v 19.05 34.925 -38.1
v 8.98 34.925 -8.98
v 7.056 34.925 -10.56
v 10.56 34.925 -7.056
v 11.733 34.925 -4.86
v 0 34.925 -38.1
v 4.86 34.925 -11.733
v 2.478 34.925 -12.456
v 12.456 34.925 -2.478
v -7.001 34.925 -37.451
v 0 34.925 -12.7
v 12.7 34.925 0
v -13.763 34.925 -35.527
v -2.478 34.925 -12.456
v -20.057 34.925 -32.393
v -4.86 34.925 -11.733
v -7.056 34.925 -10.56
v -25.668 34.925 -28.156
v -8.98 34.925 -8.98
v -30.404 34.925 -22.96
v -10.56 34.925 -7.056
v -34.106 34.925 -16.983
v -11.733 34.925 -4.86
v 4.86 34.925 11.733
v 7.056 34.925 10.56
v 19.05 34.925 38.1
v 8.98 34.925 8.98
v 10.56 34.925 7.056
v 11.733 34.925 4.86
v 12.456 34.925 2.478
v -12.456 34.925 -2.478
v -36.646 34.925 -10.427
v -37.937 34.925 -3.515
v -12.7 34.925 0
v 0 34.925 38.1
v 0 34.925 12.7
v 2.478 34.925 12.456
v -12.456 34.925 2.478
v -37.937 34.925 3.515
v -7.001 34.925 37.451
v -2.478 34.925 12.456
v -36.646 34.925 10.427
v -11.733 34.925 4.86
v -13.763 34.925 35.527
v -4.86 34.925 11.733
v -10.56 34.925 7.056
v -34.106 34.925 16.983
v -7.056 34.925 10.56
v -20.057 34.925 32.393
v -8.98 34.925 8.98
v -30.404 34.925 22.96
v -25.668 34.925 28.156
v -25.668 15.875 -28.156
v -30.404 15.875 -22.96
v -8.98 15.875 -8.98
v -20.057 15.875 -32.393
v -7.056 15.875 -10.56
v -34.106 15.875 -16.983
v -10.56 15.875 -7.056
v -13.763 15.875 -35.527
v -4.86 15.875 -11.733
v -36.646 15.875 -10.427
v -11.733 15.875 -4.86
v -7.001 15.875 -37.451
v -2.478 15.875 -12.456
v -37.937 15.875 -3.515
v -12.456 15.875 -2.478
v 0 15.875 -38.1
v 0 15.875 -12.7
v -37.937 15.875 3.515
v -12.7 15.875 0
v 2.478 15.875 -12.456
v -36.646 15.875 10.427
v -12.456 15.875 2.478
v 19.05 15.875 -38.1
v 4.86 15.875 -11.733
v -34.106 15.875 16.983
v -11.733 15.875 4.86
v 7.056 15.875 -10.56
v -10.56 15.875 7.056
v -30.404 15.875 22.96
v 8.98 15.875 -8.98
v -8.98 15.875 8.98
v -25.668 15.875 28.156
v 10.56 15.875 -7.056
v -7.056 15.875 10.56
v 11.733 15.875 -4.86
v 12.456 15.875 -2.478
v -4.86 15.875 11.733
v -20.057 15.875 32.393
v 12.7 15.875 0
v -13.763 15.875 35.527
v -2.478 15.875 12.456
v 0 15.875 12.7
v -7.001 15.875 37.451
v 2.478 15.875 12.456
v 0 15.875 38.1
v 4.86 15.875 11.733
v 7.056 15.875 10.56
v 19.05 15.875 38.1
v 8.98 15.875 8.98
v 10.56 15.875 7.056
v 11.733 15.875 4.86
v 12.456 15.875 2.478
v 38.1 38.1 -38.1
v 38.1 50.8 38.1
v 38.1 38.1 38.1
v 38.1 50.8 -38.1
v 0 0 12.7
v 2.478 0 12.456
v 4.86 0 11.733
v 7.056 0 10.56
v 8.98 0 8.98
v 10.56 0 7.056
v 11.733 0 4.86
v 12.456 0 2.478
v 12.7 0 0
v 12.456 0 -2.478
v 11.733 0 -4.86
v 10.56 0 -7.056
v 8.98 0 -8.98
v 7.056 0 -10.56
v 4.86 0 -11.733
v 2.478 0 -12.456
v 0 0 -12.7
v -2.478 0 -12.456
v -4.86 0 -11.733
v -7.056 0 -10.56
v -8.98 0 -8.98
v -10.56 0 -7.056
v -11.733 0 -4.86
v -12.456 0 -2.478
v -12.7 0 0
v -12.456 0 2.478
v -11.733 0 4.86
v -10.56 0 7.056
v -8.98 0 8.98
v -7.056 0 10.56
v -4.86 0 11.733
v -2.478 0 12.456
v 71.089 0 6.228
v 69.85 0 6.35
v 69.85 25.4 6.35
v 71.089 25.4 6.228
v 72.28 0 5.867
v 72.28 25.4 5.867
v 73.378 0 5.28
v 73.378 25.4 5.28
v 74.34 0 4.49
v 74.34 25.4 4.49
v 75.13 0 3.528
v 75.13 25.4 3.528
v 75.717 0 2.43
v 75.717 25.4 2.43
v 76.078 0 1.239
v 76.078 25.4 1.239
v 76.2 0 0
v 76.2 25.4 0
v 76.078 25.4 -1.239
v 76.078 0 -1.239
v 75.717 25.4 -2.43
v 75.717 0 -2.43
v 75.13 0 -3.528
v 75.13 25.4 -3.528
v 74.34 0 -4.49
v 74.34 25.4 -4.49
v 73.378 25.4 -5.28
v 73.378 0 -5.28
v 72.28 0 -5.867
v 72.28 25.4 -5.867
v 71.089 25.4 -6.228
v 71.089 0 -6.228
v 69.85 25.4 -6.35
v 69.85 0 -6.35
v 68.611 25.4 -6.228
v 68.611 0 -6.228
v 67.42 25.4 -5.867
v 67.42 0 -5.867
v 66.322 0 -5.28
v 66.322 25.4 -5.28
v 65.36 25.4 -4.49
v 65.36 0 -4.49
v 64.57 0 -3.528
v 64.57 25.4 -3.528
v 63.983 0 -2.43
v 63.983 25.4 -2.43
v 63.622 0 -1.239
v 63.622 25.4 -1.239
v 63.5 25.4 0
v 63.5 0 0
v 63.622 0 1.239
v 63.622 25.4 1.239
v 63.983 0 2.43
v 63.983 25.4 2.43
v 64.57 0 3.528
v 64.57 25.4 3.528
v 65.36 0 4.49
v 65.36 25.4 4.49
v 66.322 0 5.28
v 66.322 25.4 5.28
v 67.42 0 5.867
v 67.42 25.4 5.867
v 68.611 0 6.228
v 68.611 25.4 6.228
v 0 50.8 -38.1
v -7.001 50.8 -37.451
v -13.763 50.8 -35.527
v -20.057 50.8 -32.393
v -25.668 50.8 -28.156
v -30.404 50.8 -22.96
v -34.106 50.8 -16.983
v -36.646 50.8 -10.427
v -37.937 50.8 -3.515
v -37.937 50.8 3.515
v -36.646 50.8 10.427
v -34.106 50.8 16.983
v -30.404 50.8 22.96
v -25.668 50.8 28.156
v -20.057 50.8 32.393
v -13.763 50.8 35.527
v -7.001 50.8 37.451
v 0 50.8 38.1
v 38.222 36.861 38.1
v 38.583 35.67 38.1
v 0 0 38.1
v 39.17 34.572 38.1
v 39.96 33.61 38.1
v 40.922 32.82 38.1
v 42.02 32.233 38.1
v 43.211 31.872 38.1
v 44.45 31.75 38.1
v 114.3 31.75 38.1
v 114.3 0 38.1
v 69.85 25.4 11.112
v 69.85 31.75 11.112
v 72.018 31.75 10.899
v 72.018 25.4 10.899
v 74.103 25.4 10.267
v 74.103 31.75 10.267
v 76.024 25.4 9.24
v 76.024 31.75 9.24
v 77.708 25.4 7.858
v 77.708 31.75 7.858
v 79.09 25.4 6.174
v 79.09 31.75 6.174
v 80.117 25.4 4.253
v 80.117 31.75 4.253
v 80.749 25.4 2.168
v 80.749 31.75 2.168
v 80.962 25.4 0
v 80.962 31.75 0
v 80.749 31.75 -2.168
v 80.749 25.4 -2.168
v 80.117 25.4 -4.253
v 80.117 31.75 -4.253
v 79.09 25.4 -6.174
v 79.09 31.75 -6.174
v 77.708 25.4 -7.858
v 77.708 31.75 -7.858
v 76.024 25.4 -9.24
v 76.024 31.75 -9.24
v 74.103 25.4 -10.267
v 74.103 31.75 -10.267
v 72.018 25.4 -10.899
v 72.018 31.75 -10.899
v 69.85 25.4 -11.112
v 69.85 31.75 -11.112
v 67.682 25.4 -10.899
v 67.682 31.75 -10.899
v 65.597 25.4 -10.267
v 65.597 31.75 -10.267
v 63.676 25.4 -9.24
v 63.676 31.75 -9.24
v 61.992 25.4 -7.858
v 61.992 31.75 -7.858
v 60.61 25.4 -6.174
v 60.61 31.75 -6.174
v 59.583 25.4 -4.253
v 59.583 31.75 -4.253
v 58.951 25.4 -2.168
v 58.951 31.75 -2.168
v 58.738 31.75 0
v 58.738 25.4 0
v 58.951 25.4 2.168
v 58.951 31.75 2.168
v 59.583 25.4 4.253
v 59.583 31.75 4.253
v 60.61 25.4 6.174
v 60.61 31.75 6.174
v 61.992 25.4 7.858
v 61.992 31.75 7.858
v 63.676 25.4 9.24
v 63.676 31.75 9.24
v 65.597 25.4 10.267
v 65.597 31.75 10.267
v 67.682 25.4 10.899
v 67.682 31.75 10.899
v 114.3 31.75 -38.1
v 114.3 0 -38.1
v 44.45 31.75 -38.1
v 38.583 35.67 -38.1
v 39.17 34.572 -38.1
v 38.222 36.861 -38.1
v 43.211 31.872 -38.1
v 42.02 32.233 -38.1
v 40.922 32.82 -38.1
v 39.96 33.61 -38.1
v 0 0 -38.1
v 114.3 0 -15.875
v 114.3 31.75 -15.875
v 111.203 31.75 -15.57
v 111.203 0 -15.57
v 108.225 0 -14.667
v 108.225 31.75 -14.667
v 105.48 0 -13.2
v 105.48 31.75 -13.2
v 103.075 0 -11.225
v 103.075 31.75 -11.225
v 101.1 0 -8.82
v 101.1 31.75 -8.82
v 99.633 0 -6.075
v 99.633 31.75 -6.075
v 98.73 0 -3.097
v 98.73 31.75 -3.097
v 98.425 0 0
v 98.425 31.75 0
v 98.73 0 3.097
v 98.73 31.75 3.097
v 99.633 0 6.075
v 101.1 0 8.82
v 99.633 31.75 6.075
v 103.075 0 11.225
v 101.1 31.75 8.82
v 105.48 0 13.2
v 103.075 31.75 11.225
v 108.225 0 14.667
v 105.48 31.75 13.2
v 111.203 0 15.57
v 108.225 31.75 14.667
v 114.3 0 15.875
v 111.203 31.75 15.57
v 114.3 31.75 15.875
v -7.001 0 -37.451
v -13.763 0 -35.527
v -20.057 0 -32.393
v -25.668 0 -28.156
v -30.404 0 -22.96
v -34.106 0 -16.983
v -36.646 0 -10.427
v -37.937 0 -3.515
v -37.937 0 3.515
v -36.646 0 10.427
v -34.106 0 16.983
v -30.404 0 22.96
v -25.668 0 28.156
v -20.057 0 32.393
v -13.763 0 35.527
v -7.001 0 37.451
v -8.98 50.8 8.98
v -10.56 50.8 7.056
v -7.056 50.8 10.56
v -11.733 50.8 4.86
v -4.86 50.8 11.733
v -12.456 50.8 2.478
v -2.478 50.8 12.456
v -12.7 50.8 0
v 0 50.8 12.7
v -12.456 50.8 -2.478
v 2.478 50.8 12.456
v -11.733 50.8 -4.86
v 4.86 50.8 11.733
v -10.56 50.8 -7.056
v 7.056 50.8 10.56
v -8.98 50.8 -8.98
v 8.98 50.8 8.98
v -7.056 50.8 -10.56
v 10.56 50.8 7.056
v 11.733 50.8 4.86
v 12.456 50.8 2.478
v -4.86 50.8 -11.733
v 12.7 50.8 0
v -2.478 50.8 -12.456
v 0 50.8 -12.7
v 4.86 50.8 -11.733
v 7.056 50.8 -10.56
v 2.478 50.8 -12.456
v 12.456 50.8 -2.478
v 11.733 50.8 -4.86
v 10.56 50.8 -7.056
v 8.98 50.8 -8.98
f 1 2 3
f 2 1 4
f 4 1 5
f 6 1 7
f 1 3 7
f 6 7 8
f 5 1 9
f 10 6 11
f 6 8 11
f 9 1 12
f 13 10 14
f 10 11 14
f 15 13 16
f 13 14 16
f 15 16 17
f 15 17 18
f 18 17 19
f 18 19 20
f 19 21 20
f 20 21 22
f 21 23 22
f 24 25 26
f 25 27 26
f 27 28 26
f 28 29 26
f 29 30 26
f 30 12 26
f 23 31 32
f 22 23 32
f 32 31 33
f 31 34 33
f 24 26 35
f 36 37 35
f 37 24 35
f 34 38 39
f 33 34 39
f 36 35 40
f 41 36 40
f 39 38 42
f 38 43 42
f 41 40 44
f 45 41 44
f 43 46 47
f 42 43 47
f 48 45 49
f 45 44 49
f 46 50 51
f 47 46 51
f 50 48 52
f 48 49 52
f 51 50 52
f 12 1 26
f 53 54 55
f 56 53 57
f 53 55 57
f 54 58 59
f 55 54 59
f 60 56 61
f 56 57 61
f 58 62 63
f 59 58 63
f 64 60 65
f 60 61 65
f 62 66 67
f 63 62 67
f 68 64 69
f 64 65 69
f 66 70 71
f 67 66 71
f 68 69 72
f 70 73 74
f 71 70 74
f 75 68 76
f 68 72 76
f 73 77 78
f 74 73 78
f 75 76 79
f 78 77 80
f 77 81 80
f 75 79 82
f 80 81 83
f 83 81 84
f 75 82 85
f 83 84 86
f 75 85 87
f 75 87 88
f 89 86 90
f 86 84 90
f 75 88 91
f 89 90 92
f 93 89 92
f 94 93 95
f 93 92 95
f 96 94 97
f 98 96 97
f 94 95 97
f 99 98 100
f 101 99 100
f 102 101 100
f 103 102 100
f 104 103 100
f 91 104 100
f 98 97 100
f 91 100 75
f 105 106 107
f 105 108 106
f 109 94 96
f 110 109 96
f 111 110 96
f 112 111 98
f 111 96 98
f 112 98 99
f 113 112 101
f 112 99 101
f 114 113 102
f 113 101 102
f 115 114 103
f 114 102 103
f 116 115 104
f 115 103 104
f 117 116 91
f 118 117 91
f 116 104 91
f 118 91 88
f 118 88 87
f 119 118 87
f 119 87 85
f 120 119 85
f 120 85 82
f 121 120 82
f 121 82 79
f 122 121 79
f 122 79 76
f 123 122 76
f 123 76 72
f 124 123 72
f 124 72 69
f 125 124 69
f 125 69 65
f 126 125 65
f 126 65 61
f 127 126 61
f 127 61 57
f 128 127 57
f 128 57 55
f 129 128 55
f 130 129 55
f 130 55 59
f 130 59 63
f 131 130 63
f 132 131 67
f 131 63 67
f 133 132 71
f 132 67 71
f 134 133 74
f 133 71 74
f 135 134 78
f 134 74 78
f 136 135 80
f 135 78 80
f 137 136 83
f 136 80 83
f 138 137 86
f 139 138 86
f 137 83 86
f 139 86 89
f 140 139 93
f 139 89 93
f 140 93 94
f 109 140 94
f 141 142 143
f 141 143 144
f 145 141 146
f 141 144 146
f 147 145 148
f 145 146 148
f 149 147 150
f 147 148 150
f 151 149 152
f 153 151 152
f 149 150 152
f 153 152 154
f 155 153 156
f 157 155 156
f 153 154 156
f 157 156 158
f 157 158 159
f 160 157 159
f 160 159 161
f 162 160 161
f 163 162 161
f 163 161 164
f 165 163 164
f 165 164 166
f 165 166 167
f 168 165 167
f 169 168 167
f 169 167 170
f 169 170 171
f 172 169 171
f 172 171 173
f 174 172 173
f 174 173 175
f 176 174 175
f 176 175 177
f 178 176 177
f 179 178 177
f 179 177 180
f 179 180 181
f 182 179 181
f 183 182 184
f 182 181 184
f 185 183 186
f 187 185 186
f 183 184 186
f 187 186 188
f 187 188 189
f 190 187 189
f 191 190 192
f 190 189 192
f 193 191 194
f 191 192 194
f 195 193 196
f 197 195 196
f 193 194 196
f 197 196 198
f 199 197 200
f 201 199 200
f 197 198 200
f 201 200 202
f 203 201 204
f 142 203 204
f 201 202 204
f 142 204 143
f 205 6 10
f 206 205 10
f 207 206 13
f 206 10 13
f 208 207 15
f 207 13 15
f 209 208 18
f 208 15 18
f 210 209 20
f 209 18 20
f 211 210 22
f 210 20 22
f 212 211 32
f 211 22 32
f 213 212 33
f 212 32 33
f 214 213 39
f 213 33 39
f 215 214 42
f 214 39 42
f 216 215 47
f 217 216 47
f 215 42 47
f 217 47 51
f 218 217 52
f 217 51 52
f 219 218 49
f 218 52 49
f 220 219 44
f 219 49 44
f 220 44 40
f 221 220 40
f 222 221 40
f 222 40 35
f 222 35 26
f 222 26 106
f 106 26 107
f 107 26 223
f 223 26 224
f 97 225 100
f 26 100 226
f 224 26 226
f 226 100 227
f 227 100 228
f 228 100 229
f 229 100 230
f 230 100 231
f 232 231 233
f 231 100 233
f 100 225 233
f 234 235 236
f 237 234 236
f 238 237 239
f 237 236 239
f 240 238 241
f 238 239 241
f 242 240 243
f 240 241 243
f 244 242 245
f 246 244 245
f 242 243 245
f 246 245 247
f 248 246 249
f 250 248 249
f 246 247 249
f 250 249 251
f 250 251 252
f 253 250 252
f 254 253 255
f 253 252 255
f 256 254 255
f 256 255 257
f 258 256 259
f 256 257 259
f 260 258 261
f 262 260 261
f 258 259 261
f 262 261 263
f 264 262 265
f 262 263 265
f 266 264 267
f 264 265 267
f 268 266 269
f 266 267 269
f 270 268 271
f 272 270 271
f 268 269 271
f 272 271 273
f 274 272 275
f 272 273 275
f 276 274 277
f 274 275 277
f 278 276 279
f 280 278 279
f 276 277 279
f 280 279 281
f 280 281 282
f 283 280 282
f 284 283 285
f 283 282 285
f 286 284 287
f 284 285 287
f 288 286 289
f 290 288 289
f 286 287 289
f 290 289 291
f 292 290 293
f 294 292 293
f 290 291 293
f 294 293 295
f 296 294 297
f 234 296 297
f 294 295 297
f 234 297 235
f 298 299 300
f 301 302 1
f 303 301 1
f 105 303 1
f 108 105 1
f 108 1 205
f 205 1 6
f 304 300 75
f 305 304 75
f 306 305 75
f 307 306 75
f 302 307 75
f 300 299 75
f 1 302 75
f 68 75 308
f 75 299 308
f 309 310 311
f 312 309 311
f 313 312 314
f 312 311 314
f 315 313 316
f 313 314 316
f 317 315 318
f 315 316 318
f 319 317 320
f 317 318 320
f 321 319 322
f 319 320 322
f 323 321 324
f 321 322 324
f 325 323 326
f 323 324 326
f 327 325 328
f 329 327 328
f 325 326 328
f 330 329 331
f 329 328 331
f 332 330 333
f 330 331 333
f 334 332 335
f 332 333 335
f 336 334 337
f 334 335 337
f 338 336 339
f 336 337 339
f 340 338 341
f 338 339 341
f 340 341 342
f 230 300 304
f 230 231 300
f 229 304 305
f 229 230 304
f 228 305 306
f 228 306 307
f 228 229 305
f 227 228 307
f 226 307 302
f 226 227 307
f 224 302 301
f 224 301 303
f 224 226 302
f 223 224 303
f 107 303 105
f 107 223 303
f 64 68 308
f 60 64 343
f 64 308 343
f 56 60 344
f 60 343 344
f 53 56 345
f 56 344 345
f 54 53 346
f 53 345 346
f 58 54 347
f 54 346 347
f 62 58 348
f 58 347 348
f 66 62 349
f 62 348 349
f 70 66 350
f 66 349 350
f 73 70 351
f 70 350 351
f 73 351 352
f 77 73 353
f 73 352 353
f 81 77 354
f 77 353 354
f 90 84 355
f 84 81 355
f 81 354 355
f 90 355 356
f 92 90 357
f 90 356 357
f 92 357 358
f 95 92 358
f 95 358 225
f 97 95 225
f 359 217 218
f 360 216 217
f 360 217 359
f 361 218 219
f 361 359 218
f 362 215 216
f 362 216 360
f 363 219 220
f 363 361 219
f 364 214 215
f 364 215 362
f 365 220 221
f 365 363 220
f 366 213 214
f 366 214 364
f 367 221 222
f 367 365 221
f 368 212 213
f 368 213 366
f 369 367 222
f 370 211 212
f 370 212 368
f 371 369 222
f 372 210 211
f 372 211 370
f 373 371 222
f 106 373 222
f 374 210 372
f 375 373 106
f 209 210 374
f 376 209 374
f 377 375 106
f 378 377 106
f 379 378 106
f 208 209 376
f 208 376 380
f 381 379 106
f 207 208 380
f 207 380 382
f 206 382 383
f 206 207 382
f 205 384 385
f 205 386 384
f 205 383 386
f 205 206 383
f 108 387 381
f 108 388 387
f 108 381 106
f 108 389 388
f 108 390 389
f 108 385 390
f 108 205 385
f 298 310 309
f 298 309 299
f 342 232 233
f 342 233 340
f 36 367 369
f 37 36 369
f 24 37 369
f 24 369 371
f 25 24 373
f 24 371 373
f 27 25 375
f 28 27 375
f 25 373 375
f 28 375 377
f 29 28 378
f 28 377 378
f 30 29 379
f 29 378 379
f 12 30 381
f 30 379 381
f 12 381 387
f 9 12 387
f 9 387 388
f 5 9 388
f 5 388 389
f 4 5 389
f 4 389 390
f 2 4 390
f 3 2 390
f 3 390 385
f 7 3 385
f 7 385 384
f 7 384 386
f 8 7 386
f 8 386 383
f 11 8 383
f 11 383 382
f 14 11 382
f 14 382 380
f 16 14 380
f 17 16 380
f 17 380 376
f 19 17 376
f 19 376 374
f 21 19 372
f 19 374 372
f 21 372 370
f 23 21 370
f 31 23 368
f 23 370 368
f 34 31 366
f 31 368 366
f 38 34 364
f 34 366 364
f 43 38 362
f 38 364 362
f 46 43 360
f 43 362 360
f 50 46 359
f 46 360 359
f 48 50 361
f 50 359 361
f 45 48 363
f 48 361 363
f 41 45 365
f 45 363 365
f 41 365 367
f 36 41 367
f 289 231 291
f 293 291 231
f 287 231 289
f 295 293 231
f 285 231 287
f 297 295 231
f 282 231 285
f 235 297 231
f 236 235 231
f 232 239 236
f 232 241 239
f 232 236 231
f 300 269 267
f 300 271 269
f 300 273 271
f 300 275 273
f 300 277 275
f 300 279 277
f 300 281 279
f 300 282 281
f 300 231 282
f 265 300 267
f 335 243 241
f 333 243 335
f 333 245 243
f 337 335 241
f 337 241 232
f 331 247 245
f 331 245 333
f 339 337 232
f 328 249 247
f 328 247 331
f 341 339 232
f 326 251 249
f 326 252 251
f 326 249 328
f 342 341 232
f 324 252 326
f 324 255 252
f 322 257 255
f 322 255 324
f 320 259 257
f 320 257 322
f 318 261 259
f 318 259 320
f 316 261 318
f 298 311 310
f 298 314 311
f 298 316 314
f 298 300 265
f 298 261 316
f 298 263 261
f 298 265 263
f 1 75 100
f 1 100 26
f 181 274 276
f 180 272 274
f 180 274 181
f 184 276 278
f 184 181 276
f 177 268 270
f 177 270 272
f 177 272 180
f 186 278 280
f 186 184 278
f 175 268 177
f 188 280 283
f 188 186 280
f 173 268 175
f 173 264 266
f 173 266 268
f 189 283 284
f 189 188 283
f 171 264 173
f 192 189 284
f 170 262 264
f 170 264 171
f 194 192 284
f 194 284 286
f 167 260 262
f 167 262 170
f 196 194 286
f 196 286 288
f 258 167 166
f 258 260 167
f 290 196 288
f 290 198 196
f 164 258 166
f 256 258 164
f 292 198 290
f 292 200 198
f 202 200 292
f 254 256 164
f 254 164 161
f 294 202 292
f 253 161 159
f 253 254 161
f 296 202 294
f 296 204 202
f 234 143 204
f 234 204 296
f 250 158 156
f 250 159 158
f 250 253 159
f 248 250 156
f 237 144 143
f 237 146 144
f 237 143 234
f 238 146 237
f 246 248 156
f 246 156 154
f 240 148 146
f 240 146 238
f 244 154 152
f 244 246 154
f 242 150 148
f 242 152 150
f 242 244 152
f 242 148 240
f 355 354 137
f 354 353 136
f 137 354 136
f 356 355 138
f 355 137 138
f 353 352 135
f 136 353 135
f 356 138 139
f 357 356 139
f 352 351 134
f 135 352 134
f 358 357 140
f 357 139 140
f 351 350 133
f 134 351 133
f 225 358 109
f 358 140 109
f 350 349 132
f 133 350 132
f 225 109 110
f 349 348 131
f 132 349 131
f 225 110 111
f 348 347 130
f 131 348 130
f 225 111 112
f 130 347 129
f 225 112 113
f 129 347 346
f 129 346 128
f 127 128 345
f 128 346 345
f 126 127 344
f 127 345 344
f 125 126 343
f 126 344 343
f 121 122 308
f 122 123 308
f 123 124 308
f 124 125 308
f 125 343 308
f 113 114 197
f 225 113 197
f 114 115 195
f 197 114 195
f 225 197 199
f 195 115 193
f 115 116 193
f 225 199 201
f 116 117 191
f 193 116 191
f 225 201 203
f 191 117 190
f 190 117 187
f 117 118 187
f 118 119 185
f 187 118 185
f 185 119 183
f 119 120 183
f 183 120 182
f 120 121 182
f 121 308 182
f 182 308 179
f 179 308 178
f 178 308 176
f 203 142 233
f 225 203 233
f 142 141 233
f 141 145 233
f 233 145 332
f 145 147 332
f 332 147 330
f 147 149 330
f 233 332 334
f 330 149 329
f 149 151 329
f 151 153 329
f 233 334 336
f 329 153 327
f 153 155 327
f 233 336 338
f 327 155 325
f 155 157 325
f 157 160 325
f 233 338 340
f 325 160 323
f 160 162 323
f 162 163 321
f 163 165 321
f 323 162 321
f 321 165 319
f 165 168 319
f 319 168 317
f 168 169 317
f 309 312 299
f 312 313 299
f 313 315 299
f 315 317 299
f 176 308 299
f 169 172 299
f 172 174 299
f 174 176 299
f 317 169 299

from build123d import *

# Parameters (mm, degrees)
BOSS_EXTRUDE1_DEPTH     = 50.8
CUT_EXTRUDE1_DEPTH      = 147.463544952
CUT_EXTRUDE1_DEPTH_BACK = 147.463544952
FILLET1_R               = 6.35
SKETCH5_W               = 19.05
SKETCH5_H               = 19.05
SKETCH5_W_2             = 47.515662577
CUT_EXTRUDE2_DEPTH      = 147.463544952
SKETCH6_R               = 12.7
CUT_EXTRUDE3_DEPTH      = 131.754502791
SKETCH7_R               = 15.875
SKETCH7_R_2             = 6.35
CUT_EXTRUDE4_DEPTH      = 125.595997127
SKETCH8_R               = 11.1125
CUT_EXTRUDE5_DEPTH      = 6.35


with BuildPart() as part:
    # Sketch2 → Boss-Extrude1 (new body)
    with BuildSketch(Plane(origin=(0, 0, 0), x_dir=(1, 0, 0), z_dir=(0, 1, 0))):
        with BuildLine():
            Line((0, -38.1), (114.3, -38.1))
            Line((114.3, -38.1), (114.3, 38.1))
            Line((114.3, 38.1), (0, 38.1))
            ThreePointArc((0, 38.1), (-38.1, 0), (0, -38.1))
        make_face()
    extrude(amount=BOSS_EXTRUDE1_DEPTH)

    # Sketch3 → Cut-Extrude1 (cut, two sides: drawn at the far end of the back side and taken through both)
    with BuildSketch(Plane.XY.offset(38.1).offset(-CUT_EXTRUDE1_DEPTH_BACK)):
        Polygon((38.1, 372.144327072), (38.1, 50.8), (38.1, 31.75), (114.3, 31.75), (435.644327072, 31.75), (853.647106265, 519.932735), (456.102779193, 860.327062073), align=None)
    extrude(amount=CUT_EXTRUDE1_DEPTH + CUT_EXTRUDE1_DEPTH_BACK, mode=Mode.SUBTRACT)

    # Fillet1
    fillet1_edges = [part.edges().sort_by_distance(p)[0] for p in [
        (38.1, 31.75, 0),
    ]]
    fillet(fillet1_edges, radius=FILLET1_R)

    # Sketch5 → Cut-Extrude2 (cut, through all)
    with BuildSketch(Plane.XY.offset(38.1)):
        with Locations((9.525, 25.4)):
            Rectangle(SKETCH5_W, SKETCH5_H)
        with Locations((-23.757831289, 25.4)):
            Rectangle(SKETCH5_W_2, SKETCH5_H)
    extrude(amount=-CUT_EXTRUDE2_DEPTH, mode=Mode.SUBTRACT)

    # Sketch6 → Cut-Extrude3 (cut, through all)
    with BuildSketch(Plane(origin=(0, 50.8, 0), x_dir=(1, 0, 0), z_dir=(0, 1, 0))):
        with Locations(Location((0, 0, 0), (0, 0, 270))):
            Circle(SKETCH6_R)
    extrude(amount=-CUT_EXTRUDE3_DEPTH, mode=Mode.SUBTRACT)

    # Sketch7 → Cut-Extrude4 (cut, through all)
    with BuildSketch(Plane(origin=(0, 31.75, 0), x_dir=(1, 0, 0), z_dir=(0, 1, 0))):
        with Locations((114.3, 0)):
            Circle(SKETCH7_R)
        with Locations(Location((69.85, 0, 0), (0, 0, 270))):
            Circle(SKETCH7_R_2)
    extrude(amount=-CUT_EXTRUDE4_DEPTH, mode=Mode.SUBTRACT)

    # Sketch8 → Cut-Extrude5 (cut)
    with BuildSketch(Plane(origin=(0, 31.75, 0), x_dir=(1, 0, 0), z_dir=(0, 1, 0))):
        with Locations(Location((69.85, 0, 0), (0, 0, 270))):
            Circle(SKETCH8_R)
    extrude(amount=-CUT_EXTRUDE5_DEPTH, mode=Mode.SUBTRACT)


solid = part.part
